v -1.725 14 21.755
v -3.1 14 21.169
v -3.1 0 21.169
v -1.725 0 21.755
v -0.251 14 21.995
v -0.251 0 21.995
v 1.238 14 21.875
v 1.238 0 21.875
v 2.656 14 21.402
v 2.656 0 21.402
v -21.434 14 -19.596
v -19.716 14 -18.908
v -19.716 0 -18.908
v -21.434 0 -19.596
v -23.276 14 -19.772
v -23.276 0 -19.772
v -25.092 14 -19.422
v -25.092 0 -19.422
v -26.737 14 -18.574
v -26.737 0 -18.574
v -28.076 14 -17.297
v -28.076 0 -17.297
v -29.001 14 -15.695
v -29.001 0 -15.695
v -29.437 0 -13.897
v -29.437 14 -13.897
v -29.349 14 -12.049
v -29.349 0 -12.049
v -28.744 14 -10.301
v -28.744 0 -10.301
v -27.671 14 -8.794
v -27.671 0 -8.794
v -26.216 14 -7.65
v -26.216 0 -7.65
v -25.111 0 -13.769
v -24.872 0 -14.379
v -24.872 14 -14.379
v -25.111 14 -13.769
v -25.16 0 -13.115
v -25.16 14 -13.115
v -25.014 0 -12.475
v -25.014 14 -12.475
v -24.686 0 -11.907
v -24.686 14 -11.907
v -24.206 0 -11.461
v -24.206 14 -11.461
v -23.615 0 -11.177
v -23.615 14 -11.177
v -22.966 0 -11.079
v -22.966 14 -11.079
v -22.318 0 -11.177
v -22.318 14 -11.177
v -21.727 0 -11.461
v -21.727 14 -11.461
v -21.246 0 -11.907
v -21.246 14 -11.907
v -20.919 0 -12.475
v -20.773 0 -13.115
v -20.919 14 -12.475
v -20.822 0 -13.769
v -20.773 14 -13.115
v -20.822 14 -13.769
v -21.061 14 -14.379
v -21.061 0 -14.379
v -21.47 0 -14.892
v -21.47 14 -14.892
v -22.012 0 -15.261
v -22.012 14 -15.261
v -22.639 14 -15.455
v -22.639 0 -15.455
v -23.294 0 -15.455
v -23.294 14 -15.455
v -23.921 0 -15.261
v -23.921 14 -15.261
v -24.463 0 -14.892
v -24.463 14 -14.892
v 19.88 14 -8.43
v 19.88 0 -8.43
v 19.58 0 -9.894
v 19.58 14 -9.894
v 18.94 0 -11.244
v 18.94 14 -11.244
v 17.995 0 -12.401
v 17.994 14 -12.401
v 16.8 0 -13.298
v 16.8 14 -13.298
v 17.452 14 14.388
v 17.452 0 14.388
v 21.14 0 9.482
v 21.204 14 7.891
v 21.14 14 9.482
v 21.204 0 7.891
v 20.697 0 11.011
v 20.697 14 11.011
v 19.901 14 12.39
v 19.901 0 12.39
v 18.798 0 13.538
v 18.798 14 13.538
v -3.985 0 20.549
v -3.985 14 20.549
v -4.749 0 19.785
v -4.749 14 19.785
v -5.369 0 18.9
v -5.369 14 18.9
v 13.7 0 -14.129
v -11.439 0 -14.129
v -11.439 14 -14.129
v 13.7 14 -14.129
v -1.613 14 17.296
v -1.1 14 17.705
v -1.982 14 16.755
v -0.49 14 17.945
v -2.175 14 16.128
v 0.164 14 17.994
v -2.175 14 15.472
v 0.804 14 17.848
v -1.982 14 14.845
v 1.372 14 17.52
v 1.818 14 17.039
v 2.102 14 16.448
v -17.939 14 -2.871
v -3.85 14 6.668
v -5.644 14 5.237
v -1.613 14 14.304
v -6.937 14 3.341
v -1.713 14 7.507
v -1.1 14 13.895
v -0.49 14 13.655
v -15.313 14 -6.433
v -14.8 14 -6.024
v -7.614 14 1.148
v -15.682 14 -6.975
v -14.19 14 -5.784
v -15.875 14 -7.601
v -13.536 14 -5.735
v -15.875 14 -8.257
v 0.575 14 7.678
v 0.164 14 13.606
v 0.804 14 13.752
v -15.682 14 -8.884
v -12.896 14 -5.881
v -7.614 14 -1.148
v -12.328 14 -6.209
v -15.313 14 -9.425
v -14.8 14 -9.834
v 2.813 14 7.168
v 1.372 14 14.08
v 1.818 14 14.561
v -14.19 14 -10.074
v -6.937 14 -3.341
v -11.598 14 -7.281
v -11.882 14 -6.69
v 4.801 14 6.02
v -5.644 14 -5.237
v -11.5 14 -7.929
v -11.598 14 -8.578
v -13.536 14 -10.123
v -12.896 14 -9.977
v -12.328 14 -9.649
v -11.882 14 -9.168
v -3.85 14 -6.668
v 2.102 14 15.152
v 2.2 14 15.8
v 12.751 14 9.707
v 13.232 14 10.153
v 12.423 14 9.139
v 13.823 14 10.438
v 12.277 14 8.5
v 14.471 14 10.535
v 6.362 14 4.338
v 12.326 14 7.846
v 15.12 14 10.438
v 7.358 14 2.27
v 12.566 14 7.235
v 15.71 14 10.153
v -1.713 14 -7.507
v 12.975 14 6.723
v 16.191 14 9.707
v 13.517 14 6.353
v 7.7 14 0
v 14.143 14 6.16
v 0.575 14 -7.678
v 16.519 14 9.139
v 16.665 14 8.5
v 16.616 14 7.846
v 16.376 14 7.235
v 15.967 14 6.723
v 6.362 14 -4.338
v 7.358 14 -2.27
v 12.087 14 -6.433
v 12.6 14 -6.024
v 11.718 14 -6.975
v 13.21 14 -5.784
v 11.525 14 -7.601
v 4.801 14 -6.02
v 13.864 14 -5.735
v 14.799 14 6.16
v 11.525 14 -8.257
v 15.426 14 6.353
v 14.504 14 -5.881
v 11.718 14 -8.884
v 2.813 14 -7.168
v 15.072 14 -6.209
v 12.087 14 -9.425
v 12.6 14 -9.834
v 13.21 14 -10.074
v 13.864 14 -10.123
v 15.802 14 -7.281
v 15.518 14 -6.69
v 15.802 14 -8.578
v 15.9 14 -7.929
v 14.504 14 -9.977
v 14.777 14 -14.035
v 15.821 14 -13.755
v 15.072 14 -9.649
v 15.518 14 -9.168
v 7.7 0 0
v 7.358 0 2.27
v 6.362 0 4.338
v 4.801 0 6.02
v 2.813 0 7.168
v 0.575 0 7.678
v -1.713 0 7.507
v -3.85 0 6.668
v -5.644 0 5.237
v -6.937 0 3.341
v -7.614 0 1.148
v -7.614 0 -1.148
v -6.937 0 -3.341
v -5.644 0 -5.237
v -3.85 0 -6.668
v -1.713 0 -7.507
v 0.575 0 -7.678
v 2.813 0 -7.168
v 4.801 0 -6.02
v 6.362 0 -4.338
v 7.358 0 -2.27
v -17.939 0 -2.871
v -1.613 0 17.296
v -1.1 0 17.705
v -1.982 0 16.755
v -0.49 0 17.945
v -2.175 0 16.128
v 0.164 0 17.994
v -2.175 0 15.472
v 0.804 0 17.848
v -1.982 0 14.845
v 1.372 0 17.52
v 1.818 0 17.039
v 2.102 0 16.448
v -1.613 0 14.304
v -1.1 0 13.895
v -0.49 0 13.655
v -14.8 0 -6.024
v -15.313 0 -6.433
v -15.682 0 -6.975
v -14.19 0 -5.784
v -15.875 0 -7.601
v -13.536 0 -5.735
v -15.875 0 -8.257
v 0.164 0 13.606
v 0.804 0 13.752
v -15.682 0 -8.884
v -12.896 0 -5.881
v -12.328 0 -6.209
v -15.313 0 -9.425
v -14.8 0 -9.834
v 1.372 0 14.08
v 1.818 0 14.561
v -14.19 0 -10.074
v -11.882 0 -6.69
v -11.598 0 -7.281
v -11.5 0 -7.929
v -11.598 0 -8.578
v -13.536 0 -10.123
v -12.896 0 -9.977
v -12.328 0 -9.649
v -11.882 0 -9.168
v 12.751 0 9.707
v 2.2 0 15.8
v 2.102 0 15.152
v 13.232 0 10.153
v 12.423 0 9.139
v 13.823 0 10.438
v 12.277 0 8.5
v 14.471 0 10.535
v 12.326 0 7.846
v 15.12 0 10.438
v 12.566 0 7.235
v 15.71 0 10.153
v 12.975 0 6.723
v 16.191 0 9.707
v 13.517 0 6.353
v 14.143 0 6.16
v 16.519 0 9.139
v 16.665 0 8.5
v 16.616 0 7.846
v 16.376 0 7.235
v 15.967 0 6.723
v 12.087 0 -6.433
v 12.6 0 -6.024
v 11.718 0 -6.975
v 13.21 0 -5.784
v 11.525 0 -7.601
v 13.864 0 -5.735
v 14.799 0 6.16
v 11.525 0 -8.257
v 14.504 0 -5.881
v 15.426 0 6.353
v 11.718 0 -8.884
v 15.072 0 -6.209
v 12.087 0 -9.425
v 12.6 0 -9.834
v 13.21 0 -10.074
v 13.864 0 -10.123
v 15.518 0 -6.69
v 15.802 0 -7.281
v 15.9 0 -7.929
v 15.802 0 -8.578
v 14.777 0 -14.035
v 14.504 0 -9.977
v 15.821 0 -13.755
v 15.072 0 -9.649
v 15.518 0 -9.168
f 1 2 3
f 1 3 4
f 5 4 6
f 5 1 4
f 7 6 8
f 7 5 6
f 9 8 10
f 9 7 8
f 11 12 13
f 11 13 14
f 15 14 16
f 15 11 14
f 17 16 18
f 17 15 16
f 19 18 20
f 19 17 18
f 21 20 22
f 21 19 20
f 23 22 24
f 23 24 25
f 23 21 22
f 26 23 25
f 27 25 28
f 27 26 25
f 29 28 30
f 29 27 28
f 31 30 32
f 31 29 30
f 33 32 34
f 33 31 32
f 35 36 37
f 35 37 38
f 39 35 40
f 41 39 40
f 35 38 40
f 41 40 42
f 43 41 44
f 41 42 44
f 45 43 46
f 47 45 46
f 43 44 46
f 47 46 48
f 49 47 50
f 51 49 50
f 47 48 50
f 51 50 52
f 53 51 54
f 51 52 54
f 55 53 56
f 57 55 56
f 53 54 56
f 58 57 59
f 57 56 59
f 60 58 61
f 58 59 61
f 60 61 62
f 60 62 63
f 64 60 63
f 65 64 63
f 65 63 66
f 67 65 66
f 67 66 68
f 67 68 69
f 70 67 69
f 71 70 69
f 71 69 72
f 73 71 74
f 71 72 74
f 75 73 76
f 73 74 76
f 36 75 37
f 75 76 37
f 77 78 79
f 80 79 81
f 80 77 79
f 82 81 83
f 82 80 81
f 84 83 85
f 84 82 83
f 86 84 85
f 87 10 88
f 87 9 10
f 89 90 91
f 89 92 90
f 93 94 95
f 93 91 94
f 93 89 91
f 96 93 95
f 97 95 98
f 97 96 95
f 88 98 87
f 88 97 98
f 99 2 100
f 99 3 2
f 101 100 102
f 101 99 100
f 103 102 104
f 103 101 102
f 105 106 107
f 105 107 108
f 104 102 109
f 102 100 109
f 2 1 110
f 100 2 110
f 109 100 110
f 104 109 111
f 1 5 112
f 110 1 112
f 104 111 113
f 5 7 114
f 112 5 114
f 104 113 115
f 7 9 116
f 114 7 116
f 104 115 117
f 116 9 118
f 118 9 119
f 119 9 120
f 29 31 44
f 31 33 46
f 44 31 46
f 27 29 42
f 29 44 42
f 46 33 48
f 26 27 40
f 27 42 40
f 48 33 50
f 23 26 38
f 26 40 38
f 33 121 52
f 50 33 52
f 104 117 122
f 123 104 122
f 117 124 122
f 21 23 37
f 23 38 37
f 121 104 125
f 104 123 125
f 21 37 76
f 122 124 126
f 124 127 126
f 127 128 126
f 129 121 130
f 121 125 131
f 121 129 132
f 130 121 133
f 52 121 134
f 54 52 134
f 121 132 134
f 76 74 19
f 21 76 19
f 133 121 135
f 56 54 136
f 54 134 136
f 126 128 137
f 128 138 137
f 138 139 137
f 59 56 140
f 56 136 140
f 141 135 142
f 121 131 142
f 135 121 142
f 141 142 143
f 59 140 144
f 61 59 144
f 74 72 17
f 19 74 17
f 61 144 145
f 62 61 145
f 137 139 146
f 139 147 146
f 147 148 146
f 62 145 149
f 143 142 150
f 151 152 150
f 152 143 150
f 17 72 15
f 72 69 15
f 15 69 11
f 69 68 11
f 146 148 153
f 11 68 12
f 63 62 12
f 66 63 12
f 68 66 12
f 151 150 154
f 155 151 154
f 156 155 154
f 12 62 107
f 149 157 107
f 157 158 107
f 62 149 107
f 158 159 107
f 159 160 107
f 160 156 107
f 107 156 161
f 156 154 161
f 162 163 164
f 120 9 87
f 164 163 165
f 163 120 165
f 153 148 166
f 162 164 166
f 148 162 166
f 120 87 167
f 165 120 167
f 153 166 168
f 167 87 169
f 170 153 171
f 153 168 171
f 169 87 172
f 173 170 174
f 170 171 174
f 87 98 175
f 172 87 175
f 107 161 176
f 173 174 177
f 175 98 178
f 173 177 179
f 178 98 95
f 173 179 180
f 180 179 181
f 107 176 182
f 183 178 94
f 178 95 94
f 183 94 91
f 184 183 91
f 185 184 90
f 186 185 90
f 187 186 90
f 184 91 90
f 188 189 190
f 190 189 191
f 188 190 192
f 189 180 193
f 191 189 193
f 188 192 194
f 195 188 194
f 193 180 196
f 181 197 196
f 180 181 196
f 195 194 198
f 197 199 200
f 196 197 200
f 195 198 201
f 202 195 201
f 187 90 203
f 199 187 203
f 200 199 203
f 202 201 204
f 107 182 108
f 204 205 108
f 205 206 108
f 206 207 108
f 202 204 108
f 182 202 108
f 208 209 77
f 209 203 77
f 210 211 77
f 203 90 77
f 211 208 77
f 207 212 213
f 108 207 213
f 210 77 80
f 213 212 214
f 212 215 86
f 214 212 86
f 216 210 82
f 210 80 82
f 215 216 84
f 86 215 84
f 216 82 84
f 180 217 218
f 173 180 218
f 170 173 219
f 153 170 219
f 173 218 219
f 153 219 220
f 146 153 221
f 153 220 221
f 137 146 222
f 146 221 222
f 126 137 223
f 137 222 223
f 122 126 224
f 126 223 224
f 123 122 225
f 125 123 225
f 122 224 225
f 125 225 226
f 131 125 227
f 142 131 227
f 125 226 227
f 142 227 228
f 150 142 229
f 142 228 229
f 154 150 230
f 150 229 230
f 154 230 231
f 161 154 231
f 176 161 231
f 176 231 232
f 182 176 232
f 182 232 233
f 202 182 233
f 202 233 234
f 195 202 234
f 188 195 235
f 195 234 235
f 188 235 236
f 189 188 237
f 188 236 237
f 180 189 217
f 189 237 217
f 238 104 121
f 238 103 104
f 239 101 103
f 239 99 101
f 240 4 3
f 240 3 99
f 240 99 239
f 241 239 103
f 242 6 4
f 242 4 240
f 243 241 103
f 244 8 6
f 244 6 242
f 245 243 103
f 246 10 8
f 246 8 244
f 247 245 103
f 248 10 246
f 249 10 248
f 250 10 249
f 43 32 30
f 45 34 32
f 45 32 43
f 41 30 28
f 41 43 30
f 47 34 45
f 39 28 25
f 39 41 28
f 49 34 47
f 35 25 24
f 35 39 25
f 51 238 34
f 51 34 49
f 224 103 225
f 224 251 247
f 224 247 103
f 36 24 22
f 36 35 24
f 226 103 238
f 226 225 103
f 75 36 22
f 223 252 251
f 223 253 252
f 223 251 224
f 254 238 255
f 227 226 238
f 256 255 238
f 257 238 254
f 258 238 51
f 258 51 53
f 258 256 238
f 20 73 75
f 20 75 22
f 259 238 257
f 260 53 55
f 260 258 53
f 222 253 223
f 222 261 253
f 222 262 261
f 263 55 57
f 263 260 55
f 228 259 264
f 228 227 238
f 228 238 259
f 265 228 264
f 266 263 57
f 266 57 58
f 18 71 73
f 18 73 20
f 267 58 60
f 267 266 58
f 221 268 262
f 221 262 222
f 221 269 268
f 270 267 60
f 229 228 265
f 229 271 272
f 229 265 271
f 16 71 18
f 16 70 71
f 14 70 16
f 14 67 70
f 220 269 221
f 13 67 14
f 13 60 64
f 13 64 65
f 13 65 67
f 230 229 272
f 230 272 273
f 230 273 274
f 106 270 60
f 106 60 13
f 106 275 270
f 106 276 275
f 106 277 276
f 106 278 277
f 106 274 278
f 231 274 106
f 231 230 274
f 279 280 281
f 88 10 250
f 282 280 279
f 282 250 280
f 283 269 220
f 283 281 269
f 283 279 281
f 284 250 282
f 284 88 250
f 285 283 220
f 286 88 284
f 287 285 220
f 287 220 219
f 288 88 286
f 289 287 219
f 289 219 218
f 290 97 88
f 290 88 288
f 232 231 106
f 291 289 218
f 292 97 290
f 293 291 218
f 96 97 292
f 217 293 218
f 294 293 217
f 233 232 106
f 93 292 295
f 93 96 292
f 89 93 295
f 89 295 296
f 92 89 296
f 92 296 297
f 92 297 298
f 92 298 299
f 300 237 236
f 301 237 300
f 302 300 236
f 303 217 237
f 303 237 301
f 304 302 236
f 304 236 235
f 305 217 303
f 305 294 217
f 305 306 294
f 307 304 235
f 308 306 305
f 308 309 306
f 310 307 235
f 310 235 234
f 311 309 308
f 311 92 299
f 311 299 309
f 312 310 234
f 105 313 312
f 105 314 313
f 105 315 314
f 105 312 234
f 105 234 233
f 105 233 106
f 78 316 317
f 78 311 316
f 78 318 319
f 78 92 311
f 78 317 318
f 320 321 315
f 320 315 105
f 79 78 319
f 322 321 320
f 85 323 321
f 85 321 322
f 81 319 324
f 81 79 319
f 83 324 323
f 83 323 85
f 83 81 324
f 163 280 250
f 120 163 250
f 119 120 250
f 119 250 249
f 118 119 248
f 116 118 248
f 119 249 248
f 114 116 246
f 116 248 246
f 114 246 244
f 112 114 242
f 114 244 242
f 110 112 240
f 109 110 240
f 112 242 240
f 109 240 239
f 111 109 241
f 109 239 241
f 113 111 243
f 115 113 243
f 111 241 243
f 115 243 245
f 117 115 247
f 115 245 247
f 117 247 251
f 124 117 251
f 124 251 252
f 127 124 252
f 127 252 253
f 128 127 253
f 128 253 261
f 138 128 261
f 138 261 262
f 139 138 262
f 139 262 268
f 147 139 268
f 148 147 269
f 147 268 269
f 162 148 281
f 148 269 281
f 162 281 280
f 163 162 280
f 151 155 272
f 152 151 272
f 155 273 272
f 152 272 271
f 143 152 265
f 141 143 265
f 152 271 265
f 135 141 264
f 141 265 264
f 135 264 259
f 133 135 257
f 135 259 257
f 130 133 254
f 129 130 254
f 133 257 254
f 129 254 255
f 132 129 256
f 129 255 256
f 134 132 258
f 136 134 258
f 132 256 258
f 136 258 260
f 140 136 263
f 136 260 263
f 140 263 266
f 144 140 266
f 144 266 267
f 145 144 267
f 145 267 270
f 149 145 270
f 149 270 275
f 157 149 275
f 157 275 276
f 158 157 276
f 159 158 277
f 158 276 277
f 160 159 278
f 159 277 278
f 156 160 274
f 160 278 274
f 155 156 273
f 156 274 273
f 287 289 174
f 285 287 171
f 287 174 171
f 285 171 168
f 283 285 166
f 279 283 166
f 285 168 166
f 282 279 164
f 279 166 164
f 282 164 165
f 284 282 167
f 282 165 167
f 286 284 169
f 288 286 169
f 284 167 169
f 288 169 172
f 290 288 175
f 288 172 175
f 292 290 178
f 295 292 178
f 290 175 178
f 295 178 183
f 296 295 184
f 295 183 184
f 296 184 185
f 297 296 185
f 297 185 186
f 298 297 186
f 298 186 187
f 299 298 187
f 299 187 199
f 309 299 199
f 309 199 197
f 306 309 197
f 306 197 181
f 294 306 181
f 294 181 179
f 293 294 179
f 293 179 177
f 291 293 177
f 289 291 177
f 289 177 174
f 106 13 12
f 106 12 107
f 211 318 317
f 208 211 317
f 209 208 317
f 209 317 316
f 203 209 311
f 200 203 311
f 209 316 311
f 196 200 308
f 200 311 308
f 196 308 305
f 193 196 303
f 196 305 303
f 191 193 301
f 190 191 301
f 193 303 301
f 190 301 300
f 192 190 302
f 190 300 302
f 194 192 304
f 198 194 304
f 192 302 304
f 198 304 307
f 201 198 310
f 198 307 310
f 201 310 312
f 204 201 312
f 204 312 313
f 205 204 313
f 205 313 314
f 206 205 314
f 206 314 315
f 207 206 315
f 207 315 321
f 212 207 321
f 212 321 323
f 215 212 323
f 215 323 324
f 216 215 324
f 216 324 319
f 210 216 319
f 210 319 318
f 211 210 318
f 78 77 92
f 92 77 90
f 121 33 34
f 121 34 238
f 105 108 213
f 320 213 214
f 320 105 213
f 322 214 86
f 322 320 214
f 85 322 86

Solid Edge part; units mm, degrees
sketch "Sketch1" plane through (0, 0, 0) normal (0, -1, 0) x (1, 0, 0)
  line L0 (-5.3694, 18.9) -> (-19.0694, -4.8291)
  arc A0 (-13.7, -14.1291) -> (-19.0694, -4.8291) centre (-13.7, -7.9291) cw
  line L1 (-13.7, -14.1291) -> (13.7, -14.1291)
  arc A1 (19.0694, -4.8291) -> (13.7, -14.1291) centre (13.7, -7.9291) cw
  line L2 (5.3694, 18.9) -> (19.0694, -4.8291)
  arc A2 (-5.3694, 18.9) -> (5.3694, 18.9) centre (0, 15.8) cw
  dimension "D1" = 5.3694
extrude "Protrusion1" add sketch "Sketch1" against normal blind 14
sketch "Sketch2" plane through (0, 0, 0) normal (0, -1, 0) x (1, 0, 0)
  circle A0 centre (-13.7, -7.9291) radius 2.2
  circle A1 centre (13.7, -7.9291) radius 2.2
  circle A2 centre (0, 15.8) radius 2.2
  dimension "D1" = 30.8
  dimension "D2" = 4
  dimension "D3" = 4.4
  dimension "D4" = 6.2
  dimension "D5" = 6.2
  dimension "D6" = 4.4
  dimension "D7" = 6.2
  dimension "D8" = 27.4
  dimension "D9" = 27.4
  dimension "D10" = 27.4
extrude "Cutout1" cut sketch "Sketch2" against normal blind 457.8755
sketch "Sketch3" plane through (0, 0, 0) normal (0, -1, 0) x (1, 0, 0)
  circle A0 centre (0, 0) radius 7.7
extrude "Cutout2" cut sketch "Sketch3" against normal blind 434.4917
sketch "Sketch4" plane through (0, 0, 3.9355) normal (0, -1, 0) x (-0.5, 0, 0.8660254)
  line L0 (-23.325, -5.9323) -> (-23.325, -18.9323)
  line L1 (-23.325, -18.9323) -> (16.475, -18.9323)
  line L2 (16.475, -18.9323) -> (16.475, -5.9323)
  line L3 (12.7755, -8.7037) -> (16.475, -5.9323)
  line L4 (-20.9306, -8.7037) -> (12.7755, -8.7037)
  line L5 (-20.9306, -5.9323) -> (-20.9306, -8.7037)
  line L6 (-23.325, -5.9323) -> (-20.9306, -5.9323)
  dimension "D1" = 13
extrude "Protrusion2" add sketch "Sketch4" against normal up to vertex (14 mm away)
sketch "Sketch5" plane through (18.1083, 8, 10.4355) normal (0.8660254, 0, 0.5) x (-0.5, 0, 0.8660254)
  line L0 (-19.9, 8) -> (19.9, 8)
  line L1 (19.9, -6) -> (19.9, 8)
  line L2 (-19.9, -6) -> (19.9, -6)
  line L3 (-19.9, -6) -> (-19.9, 8)
extrude "ExtrudedProtrusion_14" add sketch "Sketch5" along normal blind 4
sketch "Sketch6" plane through (11.8615, 14, 7.7701) normal (0, 1, 0) x (-0.8660254, 0, -0.5)
  circle A0 centre (-2.5426, -0.8152) radius 2.2
  dimension "D1" = 6
  dimension "D2" = 19.9
  dimension "D3" = 4.4
extrude "ExtrudedCutout_23" cut sketch "Sketch6" against normal blind 166.5817
sketch "Sketch7" plane through (11.8615, 14, 7.7701) normal (0, 1, 0) x (-0.8660254, 0, -0.5)
  circle A0 centre (40.6865, -0.8152) radius 2.2
  line L0 (40.6865, 5.6848) -> (31.1282, 5.6848)
  line L1 (31.1282, 5.6848) -> (31.1282, 3.8832)
  line L2 (31.1282, 3.8832) -> (34.2429, 1.8592)
  line L3 (34.2429, 1.8592) -> (34.2429, -2.6486)
  line L4 (31.1282, -7.3152) -> (34.2429, -2.6486)
  line L5 (40.6865, -7.3152) -> (31.1282, -7.3152)
  arc A1 (40.6865, -7.3152) -> (40.6865, 5.6848) centre (40.6865, -0.8152) ccw
extrude "Protrusion3" add sketch "Sketch7" against normal up to vertex (14 mm away)
sketch "Sketch8" plane through (11.8615, 14, 7.7701) normal (0, 1, 0) x (-0.8660254, 0, -0.5)
  line L0 (-10.7426, -0.8152) -> (-10.7426, -20.7152)
  line L1 (-10.7426, -20.7152) -> (6.2574, -20.7152)
  arc A0 (1.1563, -18.0392) -> (6.2574, -20.7152) centre (6.2574, -14.5152) ccw
  line L2 (1.1563, -18.0392) -> (-10.7426, -0.8152)
extrude "Cutout3" cut sketch "Sketch8" against normal blind 85.4791
sketch "Sketch9" plane through (6.8865, 14, 7.7701) normal (0, 1, 0) x (-0.8660254, 0, -0.5)
  line L0 (-15.0511, 16.5973) -> (-15.0511, -3.3027)
  line L1 (-3.1522, 13.9213) -> (-15.0511, -3.3027)
  arc A0 (1.9489, 16.5973) -> (-3.1522, 13.9213) centre (1.9489, 10.3973) ccw
  line L2 (1.9489, 16.5973) -> (-15.0511, 16.5973)
extrude "ExtrudedCutout_27" cut sketch "Sketch9" against normal blind 118.3722
fillet "Round_1" radius 6.6 1 edges at (21.5724, 7, 12.4355)
